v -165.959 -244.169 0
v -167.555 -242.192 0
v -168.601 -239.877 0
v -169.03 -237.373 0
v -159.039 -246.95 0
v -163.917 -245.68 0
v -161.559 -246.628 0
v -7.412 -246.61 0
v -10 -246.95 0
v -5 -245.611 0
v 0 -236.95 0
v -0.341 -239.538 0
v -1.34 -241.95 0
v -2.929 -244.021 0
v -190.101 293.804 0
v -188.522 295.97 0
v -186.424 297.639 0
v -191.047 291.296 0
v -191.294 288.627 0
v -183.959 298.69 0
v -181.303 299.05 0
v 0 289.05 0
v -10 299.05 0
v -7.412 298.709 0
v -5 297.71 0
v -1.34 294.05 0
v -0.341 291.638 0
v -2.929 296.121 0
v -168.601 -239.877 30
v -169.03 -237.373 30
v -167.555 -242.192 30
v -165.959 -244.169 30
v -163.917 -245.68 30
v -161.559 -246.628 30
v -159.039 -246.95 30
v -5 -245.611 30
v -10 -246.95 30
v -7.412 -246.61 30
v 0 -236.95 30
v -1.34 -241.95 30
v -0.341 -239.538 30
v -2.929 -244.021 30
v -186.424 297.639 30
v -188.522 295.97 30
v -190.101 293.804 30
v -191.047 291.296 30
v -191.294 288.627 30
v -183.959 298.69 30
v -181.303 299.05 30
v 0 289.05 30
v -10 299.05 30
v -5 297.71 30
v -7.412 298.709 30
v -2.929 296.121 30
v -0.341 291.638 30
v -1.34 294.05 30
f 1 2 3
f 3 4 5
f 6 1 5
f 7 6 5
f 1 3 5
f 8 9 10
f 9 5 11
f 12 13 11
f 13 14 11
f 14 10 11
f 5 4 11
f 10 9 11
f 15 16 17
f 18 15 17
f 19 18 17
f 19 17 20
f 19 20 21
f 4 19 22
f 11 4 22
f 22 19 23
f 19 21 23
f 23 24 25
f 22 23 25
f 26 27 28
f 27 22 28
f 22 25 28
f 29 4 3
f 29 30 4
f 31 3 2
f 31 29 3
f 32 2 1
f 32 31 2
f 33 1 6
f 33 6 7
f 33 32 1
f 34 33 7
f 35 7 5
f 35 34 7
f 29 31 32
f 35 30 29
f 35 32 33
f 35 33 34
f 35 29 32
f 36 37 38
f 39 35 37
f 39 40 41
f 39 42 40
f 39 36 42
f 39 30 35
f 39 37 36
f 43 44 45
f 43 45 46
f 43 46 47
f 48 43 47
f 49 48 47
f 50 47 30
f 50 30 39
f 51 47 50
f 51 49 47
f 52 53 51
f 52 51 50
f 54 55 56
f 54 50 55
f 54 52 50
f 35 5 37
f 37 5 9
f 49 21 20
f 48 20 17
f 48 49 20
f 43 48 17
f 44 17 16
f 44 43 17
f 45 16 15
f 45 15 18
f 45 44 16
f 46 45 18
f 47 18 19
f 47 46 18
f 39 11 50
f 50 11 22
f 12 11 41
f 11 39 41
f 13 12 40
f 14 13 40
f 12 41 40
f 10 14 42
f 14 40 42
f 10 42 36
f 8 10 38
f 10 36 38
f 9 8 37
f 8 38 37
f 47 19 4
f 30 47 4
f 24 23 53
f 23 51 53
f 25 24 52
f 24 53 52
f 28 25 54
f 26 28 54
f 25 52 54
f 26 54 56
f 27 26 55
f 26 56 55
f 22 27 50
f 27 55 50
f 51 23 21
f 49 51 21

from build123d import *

# Parameters (mm, degrees)
BOSS_EXTRUDE1_DEPTH = 30
FILLET1_R           = 10
FILLET2_R           = 10


with BuildPart() as part:
    # Sketch1 → Boss-Extrude1 (new body)
    with BuildSketch(Plane.XY):
        Polygon((0, 0), (0, 299.049703647), (-191.735, 299.049703647), (-168.625, -246.950296353), (0, -246.950296353), align=None)
    extrude(amount=BOSS_EXTRUDE1_DEPTH)

    # Fillet1
    fillet1_edges = [part.edges().sort_by_distance(p)[0] for p in [
        (-191.735, 299.049703647, 15),
        (0, 299.049703647, 15),
    ]]
    fillet(fillet1_edges, radius=FILLET1_R)

    # Fillet2
    fillet2_edges = [part.edges().sort_by_distance(p)[0] for p in [
        (0, -246.950296353, 15),
        (-168.625, -246.950296353, 15),
    ]]
    fillet(fillet2_edges, radius=FILLET2_R)


solid = part.part
